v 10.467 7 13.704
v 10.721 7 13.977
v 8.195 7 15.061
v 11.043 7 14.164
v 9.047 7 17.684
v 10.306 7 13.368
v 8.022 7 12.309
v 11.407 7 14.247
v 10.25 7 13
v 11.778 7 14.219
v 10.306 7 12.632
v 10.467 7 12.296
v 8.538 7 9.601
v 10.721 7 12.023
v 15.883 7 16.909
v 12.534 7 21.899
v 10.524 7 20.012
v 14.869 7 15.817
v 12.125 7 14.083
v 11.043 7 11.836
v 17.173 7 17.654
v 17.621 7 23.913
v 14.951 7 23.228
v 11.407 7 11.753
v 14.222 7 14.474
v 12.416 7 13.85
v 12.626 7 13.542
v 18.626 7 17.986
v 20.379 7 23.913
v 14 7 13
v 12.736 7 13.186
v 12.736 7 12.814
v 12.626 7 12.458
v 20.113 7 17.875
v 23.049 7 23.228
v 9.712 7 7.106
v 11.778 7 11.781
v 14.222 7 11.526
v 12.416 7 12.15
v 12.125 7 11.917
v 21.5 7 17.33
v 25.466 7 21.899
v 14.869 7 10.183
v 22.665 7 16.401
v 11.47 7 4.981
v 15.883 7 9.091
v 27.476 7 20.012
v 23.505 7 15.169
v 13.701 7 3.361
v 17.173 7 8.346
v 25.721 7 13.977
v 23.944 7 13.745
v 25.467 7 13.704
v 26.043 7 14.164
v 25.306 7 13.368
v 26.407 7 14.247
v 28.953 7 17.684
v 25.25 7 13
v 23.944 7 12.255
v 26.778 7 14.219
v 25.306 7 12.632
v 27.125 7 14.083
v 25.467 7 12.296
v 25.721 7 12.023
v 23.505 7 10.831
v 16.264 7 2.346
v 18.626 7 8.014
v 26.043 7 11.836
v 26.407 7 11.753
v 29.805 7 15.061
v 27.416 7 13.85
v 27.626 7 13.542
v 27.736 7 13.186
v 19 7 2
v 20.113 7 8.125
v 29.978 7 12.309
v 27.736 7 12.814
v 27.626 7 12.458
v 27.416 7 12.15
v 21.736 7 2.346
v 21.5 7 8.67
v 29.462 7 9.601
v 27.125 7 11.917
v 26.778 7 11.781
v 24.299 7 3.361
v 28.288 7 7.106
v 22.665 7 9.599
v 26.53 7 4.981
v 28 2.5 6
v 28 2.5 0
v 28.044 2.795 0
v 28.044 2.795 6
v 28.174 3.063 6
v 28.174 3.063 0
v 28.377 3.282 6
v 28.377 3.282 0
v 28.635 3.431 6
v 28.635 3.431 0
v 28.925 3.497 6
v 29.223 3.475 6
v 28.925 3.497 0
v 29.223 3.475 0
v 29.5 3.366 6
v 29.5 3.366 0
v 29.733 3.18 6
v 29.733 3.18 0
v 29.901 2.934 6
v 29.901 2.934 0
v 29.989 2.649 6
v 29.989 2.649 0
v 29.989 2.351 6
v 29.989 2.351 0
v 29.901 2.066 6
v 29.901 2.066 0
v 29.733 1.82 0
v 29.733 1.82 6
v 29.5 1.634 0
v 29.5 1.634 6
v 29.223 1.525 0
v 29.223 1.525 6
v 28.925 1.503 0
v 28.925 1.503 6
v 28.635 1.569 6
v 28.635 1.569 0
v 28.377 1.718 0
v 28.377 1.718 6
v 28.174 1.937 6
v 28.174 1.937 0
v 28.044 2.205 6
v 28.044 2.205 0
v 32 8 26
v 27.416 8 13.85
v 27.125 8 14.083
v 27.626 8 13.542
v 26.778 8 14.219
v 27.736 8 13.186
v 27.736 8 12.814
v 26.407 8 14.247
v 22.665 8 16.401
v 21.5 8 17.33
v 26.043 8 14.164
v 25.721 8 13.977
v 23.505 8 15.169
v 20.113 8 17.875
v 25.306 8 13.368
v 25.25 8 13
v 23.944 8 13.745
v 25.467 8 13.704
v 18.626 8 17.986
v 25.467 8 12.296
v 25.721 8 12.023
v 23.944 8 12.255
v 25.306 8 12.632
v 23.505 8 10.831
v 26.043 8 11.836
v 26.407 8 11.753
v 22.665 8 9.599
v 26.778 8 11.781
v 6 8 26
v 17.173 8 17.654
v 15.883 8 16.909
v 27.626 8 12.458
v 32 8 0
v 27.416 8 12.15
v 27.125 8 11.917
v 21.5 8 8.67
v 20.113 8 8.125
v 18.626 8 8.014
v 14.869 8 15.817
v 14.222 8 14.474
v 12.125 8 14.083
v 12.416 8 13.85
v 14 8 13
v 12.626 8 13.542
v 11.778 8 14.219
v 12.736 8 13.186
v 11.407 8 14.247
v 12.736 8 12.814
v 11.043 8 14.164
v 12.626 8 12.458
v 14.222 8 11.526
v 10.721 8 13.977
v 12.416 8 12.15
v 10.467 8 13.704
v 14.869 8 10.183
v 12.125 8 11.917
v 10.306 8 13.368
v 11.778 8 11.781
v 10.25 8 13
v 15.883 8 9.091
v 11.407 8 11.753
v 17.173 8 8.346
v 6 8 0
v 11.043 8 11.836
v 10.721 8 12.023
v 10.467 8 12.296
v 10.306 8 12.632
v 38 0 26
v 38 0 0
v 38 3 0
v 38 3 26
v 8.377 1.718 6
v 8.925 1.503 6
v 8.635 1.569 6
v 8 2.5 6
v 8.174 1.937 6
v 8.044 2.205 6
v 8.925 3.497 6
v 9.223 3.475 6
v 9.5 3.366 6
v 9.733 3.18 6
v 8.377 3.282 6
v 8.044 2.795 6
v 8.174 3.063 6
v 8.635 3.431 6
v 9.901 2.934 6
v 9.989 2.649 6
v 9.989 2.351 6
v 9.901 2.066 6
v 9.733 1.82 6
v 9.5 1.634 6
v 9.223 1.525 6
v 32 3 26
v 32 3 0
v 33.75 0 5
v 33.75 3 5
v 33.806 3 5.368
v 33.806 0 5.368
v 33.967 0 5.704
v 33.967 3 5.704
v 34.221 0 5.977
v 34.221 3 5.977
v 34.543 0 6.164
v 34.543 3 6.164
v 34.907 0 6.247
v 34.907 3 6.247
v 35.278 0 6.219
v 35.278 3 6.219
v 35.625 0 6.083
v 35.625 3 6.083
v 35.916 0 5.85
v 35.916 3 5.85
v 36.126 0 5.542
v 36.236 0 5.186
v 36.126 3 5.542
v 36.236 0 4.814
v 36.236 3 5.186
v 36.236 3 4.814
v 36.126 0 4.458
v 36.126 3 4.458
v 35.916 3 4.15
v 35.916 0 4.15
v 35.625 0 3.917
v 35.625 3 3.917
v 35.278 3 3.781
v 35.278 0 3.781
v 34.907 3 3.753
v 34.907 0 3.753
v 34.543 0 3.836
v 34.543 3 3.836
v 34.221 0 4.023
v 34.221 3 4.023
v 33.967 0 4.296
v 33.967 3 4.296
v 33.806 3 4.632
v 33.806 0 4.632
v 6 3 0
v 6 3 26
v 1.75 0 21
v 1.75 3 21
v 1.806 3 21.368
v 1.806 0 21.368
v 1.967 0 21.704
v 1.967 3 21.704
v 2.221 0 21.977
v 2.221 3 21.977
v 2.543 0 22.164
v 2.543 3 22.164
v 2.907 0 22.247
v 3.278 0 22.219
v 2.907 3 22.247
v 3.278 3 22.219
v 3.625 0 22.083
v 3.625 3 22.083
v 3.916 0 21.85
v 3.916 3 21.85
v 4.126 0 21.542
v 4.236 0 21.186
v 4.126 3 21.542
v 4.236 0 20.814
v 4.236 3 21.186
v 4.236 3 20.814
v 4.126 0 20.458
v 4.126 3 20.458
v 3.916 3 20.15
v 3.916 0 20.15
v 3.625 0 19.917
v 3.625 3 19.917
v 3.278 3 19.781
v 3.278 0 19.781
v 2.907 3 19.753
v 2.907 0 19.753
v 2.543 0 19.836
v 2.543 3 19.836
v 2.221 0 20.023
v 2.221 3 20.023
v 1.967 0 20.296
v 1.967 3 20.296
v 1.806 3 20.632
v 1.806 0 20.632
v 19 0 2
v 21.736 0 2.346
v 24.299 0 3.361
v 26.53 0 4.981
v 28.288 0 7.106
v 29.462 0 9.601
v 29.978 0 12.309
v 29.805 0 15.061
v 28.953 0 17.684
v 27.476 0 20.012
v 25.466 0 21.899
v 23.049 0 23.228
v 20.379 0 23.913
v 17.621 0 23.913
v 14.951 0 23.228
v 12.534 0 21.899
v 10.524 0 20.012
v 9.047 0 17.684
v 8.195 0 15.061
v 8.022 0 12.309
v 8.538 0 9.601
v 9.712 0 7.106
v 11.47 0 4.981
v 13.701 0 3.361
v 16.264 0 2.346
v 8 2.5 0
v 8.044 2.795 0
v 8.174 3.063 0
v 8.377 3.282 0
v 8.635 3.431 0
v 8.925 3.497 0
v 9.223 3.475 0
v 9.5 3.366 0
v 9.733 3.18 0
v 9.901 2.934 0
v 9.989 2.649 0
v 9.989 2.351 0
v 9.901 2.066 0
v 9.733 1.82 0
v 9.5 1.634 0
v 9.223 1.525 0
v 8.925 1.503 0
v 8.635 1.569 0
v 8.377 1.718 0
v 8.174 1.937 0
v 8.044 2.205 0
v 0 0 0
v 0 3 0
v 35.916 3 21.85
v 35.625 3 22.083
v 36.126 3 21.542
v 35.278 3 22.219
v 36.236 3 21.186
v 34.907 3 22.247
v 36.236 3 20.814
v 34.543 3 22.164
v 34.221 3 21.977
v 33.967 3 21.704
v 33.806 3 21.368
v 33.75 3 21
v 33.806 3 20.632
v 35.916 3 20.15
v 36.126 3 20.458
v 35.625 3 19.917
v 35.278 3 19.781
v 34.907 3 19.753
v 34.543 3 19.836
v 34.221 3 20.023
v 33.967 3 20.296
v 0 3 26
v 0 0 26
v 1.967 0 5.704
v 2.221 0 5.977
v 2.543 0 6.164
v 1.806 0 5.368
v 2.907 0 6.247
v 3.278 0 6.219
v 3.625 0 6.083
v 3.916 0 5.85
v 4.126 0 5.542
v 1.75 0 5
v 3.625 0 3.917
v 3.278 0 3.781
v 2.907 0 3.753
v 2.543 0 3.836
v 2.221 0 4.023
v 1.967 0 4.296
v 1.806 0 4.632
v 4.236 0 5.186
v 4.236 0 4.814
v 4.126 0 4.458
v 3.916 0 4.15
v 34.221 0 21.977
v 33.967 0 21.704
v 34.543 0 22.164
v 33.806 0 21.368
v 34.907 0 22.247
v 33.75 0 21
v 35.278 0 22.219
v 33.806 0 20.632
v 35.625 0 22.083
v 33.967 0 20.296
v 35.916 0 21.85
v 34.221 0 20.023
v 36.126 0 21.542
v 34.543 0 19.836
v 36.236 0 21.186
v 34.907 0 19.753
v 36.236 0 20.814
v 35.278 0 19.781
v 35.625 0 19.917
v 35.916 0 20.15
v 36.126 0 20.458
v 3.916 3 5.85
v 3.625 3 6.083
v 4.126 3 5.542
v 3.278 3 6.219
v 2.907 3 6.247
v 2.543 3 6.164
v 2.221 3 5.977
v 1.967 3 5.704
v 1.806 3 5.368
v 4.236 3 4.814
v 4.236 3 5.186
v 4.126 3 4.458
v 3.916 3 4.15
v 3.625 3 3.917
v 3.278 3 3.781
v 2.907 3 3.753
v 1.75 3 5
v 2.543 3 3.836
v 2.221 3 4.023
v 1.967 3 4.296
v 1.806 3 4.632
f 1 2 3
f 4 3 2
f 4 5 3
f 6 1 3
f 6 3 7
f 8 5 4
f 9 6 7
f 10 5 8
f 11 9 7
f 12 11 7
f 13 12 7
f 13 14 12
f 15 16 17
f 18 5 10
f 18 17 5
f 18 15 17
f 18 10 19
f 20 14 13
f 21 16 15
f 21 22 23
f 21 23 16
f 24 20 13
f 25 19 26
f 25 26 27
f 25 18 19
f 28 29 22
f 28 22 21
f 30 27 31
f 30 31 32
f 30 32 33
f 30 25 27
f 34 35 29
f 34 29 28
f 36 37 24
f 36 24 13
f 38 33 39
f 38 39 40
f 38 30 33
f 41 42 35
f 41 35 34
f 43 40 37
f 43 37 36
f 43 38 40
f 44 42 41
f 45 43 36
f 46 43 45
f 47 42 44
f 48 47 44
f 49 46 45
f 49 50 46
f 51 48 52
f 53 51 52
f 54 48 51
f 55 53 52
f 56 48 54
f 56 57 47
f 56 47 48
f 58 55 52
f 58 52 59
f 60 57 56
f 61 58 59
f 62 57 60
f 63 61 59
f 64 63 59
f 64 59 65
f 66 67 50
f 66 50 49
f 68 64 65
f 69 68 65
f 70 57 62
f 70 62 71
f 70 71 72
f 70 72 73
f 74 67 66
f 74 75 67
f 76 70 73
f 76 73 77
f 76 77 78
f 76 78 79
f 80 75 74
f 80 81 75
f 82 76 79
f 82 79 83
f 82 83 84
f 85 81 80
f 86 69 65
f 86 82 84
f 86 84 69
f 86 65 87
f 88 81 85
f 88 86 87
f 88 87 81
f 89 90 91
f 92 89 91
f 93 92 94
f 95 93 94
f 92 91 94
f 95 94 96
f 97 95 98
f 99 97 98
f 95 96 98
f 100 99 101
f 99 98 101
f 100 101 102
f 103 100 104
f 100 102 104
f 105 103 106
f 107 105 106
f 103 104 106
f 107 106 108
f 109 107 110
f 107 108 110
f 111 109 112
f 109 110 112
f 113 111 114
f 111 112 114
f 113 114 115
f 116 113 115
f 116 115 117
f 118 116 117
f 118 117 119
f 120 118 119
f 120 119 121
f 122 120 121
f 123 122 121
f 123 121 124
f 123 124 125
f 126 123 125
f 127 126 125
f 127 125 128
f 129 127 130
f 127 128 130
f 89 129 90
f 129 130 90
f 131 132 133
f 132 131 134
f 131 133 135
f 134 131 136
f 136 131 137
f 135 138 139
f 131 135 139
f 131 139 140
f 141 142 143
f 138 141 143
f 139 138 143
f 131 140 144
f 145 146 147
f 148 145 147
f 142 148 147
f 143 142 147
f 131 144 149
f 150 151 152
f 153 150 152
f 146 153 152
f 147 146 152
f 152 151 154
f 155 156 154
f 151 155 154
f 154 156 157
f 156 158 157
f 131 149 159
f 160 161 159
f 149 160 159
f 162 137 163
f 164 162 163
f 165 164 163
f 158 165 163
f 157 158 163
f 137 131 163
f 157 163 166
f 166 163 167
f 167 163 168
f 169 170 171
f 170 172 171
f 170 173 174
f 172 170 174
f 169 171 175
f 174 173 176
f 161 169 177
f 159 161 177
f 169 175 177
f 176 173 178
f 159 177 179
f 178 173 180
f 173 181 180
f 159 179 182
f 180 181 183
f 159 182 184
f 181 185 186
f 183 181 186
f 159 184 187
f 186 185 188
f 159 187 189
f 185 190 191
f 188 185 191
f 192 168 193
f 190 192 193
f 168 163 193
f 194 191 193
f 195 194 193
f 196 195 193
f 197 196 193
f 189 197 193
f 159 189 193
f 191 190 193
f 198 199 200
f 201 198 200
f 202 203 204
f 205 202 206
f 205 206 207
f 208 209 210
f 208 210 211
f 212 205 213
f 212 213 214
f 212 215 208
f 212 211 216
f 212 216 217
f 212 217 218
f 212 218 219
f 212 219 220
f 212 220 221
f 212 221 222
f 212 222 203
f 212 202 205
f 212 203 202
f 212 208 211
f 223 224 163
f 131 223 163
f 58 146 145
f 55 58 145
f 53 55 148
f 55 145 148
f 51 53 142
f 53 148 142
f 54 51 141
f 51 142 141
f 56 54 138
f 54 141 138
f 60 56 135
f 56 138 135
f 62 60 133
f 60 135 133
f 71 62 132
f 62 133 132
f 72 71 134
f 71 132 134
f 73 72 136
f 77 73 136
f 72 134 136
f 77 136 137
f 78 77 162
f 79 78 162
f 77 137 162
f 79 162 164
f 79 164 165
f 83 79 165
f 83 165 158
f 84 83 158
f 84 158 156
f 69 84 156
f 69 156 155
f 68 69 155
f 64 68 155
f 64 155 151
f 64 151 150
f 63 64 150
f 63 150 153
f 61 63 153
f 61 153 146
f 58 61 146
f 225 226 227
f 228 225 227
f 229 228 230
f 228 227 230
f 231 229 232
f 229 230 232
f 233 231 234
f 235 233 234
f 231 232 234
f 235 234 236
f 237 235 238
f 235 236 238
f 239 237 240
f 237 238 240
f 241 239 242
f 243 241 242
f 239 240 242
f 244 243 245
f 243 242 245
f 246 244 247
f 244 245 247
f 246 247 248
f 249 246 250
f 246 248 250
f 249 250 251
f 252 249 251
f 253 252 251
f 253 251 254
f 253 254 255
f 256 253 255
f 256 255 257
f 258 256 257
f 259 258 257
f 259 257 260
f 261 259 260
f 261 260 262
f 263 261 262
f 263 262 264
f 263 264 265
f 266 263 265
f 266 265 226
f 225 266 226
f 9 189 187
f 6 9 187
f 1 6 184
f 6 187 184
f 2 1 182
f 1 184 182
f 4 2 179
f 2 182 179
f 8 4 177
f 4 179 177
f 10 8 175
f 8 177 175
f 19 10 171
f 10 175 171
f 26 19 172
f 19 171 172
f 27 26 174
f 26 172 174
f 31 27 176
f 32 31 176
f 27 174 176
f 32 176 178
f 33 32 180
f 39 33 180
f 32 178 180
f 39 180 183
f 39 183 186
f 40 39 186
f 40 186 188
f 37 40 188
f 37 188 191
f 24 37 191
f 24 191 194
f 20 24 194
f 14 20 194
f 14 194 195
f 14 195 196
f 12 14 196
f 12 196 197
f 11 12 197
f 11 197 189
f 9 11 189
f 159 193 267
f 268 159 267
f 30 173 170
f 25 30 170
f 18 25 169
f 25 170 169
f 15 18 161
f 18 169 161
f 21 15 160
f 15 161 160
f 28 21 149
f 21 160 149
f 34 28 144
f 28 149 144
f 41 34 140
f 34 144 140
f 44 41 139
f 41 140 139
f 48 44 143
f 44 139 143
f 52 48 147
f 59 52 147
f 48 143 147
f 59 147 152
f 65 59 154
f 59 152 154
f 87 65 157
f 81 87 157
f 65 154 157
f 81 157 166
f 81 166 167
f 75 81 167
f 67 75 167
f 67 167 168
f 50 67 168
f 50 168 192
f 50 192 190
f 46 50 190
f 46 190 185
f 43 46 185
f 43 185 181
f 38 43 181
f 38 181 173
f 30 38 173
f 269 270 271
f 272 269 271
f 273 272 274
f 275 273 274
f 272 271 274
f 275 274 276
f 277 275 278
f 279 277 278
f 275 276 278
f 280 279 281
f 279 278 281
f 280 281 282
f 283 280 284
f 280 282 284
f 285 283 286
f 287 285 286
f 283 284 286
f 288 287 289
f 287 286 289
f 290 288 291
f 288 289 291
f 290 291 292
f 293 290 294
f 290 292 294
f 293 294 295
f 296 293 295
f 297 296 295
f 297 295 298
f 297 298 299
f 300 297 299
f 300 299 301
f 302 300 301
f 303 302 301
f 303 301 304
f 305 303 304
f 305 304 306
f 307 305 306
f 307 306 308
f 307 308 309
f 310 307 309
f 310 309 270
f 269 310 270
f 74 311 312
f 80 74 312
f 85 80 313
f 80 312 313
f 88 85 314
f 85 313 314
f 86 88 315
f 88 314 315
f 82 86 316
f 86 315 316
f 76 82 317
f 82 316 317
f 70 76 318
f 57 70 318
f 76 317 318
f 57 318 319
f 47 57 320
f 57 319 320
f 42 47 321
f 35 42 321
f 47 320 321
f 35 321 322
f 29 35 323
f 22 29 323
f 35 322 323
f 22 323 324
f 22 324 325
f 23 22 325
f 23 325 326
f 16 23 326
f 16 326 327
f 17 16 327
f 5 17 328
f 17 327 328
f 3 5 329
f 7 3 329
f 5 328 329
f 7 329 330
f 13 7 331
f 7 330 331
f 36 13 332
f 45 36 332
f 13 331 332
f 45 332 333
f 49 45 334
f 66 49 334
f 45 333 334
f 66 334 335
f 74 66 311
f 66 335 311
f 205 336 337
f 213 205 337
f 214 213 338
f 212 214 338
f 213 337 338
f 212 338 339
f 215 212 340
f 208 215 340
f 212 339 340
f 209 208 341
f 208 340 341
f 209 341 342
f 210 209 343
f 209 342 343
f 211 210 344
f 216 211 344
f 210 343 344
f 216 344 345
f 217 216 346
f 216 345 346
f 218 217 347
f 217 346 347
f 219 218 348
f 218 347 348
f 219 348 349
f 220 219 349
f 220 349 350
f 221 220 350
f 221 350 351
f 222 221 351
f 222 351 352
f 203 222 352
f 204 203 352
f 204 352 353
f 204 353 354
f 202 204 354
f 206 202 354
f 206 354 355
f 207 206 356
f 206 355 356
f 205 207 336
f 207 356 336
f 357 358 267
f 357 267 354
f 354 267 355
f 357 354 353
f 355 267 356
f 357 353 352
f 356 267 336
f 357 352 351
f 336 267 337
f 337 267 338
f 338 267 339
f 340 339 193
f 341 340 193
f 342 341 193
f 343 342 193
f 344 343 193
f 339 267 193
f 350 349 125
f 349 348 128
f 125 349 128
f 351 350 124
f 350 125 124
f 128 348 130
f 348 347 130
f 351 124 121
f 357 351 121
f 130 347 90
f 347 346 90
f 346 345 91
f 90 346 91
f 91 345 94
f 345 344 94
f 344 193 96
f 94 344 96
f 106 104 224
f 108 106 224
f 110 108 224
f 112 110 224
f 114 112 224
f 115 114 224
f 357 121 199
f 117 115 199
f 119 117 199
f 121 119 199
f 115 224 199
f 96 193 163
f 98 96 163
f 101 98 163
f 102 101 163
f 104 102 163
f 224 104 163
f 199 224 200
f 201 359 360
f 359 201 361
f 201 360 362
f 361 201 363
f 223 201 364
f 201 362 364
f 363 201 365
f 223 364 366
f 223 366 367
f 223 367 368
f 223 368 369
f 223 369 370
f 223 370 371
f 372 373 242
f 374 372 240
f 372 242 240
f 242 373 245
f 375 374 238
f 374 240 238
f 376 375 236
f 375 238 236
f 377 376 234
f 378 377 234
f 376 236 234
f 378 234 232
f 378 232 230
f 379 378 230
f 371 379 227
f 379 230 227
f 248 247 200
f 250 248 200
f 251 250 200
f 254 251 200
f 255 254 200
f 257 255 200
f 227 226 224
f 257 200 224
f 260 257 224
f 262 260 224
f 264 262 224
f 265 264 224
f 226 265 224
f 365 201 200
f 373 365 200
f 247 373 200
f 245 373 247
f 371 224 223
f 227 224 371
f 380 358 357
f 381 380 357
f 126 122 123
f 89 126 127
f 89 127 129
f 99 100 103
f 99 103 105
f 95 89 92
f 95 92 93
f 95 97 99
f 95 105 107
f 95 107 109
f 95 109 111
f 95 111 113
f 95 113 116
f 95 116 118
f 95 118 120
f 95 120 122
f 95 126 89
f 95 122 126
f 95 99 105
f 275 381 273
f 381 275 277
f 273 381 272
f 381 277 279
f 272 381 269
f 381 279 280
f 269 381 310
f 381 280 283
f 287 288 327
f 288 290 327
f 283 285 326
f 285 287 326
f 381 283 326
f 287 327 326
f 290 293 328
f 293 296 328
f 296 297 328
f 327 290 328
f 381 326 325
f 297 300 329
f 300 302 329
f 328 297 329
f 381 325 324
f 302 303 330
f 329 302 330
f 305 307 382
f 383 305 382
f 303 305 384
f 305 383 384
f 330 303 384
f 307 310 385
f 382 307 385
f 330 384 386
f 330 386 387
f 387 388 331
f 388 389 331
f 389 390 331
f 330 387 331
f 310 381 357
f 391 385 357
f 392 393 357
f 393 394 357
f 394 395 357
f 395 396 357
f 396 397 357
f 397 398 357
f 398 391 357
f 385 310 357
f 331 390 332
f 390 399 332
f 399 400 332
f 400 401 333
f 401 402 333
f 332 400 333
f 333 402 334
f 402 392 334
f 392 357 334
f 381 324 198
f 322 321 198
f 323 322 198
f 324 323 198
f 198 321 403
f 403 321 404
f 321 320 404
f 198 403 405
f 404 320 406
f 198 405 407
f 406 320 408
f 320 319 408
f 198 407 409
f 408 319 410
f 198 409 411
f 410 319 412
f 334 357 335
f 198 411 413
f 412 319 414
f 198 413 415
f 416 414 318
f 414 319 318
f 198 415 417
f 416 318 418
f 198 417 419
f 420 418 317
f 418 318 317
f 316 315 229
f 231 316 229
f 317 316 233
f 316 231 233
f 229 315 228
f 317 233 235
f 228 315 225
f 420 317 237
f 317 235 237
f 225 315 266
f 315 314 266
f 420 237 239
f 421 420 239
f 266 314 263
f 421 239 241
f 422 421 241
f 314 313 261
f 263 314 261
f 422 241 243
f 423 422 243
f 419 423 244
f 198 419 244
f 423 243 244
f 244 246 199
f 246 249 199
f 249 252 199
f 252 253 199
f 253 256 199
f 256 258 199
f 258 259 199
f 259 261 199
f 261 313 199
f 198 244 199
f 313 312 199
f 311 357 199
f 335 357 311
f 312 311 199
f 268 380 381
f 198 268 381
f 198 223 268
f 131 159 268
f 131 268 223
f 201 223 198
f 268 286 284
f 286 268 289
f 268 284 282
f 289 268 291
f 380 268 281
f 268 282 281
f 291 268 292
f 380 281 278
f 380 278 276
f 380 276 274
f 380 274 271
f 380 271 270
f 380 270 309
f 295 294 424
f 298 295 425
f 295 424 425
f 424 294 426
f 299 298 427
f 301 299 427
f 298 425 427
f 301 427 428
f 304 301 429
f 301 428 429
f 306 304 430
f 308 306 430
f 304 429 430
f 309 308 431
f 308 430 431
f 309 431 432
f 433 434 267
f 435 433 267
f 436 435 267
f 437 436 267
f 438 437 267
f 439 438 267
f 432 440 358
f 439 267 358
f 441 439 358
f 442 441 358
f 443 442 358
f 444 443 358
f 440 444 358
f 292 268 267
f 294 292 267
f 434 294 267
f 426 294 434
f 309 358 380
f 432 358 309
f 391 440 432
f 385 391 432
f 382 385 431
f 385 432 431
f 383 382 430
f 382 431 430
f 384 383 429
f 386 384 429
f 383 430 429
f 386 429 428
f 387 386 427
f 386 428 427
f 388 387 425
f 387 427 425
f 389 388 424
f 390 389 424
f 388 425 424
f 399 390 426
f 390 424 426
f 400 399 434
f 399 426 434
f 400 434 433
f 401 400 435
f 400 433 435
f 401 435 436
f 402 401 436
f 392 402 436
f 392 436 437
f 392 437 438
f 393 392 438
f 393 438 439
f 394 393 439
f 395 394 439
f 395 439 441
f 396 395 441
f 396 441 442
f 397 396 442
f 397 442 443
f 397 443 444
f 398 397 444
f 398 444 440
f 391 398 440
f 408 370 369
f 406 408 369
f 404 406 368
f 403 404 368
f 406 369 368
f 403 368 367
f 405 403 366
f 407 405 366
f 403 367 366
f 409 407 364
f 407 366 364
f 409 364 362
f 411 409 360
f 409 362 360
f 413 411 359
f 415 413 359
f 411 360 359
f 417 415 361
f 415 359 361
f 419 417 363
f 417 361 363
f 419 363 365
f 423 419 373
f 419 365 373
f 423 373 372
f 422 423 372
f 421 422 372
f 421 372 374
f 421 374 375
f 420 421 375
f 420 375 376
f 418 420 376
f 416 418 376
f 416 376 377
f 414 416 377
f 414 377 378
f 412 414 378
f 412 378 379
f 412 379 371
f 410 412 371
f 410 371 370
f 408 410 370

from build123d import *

# Parameters (mm, degrees)
BOSS_EXTRUDE1_DEPTH = 26
SKETCH2_R           = 5
SKETCH2_R_2         = 1.25
CUT_EXTRUDE1_DEPTH  = 47.733285782
SKETCH3_R           = 11
CUT_EXTRUDE2_DEPTH  = 7
SKETCH5_R           = 1
CUT_EXTRUDE7_DEPTH  = 6


with BuildPart() as part:
    # Sketch1 → Boss-Extrude1 (new body)
    with BuildSketch(Plane.XY):
        Polygon((0, 0), (8, 0), (30, 0), (38, 0), (38, 3), (32, 3), (32, 8), (6, 8), (6, 3), (0, 3), align=None)
    extrude(amount=BOSS_EXTRUDE1_DEPTH)

    # Sketch2 → Cut-Extrude1 (cut, through all)
    with BuildSketch(Plane(origin=(0, 8, 0), x_dir=(1, 0, 0), z_dir=(0, 1, 0))):
        with Locations(Location((19, -13, 0), (0, 0, 180))):
            Circle(SKETCH2_R)
        with Locations(Location((11.5, -13, 0), (0, 0, 180))):
            Circle(SKETCH2_R_2)
        with Locations(Location((26.5, -13, 0), (0, 0, 180))):
            Circle(SKETCH2_R_2)
        with Locations(Location((3, -21, 0), (0, 0, 180))):
            Circle(SKETCH2_R_2)
        with Locations(Location((3, -5, 0), (0, 0, 180))):
            Circle(SKETCH2_R_2)
        with Locations(Location((35, -21, 0), (0, 0, 180))):
            Circle(SKETCH2_R_2)
        with Locations(Location((35, -5, 0), (0, 0, 180))):
            Circle(SKETCH2_R_2)
    extrude(amount=-CUT_EXTRUDE1_DEPTH, mode=Mode.SUBTRACT)

    # Sketch3 → Cut-Extrude2 (cut)
    with BuildSketch(Plane.XZ):
        with Locations(Location((19, 13, 0), (0, 0, 270))):
            Circle(SKETCH3_R)
    extrude(amount=-CUT_EXTRUDE2_DEPTH, mode=Mode.SUBTRACT)

    # Sketch5 → Cut-Extrude7 (cut)
    with BuildSketch(Plane(origin=(0, 0, 0), x_dir=(-1, 0, 0), z_dir=(0, 0, -1))):
        with Locations((-29, 2.5)):
            Circle(SKETCH5_R)
        with Locations((-9, 2.5)):
            Circle(SKETCH5_R)
    extrude(amount=-CUT_EXTRUDE7_DEPTH, mode=Mode.SUBTRACT)


solid = part.part
